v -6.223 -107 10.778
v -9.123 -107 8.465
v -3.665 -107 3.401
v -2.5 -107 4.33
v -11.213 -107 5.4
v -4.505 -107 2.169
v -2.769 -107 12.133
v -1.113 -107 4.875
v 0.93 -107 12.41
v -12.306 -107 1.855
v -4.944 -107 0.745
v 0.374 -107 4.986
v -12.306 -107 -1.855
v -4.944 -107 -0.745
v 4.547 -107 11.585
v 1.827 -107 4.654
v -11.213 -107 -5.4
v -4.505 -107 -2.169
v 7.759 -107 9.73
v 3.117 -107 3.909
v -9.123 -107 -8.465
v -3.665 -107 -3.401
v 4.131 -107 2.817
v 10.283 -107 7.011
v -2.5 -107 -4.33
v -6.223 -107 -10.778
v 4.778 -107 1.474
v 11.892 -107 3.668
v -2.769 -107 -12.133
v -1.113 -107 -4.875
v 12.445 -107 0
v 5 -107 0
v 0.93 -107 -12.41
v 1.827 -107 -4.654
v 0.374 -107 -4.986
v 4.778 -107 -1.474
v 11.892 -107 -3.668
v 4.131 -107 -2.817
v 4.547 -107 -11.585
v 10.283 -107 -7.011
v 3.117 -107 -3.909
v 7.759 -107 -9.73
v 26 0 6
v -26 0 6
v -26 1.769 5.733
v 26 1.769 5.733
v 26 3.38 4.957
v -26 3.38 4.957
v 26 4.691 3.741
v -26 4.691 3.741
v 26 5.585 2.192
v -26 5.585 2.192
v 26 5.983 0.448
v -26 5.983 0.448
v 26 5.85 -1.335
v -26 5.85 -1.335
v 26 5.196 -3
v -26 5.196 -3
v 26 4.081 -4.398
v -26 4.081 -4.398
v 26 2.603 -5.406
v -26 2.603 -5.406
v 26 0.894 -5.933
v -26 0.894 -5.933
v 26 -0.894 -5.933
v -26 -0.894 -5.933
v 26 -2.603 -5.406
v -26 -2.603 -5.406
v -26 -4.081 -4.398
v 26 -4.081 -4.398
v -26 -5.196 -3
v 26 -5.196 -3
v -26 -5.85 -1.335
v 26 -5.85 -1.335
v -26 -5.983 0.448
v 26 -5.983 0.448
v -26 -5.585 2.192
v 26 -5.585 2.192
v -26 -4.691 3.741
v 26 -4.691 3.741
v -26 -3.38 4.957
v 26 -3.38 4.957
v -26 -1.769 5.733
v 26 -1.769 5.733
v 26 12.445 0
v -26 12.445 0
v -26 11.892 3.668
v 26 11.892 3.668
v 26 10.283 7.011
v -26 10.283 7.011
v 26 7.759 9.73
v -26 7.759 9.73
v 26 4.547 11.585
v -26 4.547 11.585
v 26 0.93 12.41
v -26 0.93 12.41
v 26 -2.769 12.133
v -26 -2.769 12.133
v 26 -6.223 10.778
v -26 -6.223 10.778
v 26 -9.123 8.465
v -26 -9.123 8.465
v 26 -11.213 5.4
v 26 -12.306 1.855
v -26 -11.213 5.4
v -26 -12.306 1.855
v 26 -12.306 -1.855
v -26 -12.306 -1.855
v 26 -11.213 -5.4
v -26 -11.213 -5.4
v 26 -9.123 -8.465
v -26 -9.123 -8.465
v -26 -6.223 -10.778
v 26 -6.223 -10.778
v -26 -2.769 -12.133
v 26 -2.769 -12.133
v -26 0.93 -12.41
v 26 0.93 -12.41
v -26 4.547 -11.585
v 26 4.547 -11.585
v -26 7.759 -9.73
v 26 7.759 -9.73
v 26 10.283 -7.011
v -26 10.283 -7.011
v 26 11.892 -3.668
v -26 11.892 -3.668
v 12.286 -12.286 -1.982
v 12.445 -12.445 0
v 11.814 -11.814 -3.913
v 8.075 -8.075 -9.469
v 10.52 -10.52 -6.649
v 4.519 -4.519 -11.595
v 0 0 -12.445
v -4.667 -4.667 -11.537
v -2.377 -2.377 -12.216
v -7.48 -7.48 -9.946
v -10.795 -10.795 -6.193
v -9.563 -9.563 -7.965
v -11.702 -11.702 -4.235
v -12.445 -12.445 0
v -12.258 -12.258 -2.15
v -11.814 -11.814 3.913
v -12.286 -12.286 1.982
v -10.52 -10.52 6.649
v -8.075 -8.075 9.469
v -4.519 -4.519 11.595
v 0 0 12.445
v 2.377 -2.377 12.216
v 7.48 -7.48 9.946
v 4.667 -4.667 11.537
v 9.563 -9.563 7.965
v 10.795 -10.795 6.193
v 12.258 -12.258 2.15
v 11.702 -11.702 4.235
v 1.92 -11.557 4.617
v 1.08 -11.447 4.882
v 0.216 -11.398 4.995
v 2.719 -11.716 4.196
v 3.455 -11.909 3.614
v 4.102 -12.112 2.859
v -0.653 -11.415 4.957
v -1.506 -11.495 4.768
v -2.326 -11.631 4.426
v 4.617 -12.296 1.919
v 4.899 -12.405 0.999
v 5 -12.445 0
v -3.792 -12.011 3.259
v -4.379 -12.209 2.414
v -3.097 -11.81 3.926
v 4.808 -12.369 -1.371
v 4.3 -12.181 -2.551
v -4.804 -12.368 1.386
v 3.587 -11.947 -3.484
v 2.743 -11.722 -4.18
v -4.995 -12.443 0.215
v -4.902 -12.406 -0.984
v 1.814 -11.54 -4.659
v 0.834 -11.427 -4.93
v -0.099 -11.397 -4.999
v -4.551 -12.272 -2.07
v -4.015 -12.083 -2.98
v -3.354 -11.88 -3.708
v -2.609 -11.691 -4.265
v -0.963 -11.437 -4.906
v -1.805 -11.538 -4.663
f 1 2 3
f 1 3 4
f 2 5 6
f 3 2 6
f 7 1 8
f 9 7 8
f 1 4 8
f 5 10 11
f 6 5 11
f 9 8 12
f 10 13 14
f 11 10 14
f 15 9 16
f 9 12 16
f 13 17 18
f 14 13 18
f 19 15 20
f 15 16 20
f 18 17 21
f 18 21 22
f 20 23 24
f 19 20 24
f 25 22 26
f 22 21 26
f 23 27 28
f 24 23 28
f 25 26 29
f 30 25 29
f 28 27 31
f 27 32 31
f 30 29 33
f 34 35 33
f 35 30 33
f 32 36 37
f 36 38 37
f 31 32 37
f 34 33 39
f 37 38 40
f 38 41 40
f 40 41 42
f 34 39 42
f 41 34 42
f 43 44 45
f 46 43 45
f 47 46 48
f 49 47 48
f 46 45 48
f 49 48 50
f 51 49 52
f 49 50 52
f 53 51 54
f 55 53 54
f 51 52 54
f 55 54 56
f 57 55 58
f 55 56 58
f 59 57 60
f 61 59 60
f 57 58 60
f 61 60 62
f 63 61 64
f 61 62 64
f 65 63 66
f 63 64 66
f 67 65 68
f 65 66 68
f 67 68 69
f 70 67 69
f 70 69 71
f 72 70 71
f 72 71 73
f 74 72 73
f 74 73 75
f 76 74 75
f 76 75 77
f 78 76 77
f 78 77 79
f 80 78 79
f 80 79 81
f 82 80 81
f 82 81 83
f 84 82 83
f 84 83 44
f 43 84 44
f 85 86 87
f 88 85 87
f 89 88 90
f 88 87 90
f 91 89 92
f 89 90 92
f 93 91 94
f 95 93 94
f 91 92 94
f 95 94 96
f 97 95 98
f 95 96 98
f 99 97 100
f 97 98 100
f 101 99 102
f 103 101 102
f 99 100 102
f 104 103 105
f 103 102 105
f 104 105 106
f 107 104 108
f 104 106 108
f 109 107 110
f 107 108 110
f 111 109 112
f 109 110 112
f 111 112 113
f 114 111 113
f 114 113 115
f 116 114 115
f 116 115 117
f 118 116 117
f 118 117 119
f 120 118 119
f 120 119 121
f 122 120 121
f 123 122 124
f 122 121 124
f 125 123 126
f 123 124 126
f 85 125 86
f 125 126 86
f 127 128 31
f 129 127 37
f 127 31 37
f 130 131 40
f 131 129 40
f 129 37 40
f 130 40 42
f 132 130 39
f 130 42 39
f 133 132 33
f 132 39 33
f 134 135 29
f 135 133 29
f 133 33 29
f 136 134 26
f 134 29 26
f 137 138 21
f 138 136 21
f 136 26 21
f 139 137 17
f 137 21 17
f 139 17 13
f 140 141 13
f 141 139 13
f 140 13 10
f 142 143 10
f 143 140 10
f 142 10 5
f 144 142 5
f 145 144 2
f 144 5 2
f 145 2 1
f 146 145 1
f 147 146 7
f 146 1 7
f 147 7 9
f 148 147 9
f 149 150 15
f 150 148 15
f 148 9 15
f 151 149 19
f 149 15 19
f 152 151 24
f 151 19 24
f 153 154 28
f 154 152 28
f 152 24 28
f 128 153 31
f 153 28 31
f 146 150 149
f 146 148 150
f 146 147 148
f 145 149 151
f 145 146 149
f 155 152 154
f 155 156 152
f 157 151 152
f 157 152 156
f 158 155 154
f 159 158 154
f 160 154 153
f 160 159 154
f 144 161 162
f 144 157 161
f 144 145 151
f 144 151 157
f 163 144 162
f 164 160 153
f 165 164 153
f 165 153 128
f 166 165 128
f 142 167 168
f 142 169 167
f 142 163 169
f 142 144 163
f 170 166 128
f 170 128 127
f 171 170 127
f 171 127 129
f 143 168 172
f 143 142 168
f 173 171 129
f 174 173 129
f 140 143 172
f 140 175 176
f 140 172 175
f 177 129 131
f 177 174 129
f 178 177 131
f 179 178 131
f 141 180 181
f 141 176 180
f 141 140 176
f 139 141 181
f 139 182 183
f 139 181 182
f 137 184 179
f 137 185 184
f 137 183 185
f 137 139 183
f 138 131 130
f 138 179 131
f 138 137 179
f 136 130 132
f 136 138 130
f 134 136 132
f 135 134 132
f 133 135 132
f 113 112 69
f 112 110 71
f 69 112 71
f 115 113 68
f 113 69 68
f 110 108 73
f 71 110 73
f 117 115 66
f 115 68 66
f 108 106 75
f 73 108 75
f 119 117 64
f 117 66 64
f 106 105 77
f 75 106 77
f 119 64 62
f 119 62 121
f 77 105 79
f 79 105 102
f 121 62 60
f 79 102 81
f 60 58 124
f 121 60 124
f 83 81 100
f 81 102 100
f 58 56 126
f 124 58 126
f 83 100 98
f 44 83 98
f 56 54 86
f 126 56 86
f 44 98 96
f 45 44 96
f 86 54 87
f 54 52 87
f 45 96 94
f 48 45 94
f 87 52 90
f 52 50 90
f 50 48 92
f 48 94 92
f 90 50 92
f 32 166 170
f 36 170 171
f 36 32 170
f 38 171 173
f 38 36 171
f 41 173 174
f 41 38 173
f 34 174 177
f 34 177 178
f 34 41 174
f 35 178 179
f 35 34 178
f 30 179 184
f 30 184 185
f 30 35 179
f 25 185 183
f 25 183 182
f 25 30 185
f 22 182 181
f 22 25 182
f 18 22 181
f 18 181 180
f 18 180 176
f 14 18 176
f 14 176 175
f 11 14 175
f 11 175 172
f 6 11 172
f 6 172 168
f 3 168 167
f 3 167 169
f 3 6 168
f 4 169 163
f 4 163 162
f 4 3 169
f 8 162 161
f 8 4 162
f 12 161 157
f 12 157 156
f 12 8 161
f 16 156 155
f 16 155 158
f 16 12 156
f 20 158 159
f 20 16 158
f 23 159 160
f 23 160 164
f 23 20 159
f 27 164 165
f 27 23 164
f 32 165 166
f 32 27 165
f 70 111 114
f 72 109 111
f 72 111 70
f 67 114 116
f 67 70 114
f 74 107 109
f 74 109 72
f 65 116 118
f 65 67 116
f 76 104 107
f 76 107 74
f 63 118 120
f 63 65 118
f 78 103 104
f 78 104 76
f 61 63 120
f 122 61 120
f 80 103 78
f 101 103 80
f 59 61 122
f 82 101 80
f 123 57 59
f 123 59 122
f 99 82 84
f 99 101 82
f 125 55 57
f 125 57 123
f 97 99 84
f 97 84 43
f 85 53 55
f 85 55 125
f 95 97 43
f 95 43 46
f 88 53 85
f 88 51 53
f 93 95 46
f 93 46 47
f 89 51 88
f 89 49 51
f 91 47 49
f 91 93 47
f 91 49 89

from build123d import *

# Parameters (mm, degrees)
PIPE_START                      = -107
PIPE_26_9_X_3_2_1_OUTLINE_R     = 12.445
PIPE_26_9_X_3_2_1_OUTLINE_R_2   = 5
PIPE_26_9_X_3_2_1_DEPTH         = 94.5549999
PIPE_START_2                    = -12.4450001
PIPE_26_9_X_3_2_1_2_OUTLINE_R   = 12.445
PIPE_26_9_X_3_2_1_2_OUTLINE_R_2 = 5
PIPE_26_9_X_3_2_1_2_DEPTH       = 12.4450002
PIPE_START_3                    = -13
PIPE_26_9_X_3_2_1_3_DEPTH       = 26
PIPE_START_4                    = -26
PIPE_26_9_X_3_2_1_4_OUTLINE_R   = 12.445
PIPE_26_9_X_3_2_1_4_OUTLINE_R_2 = 5
PIPE_26_9_X_3_2_1_4_DEPTH       = 52
SKETCH13_R                      = 6
CUT_EXTRUDE1_DEPTH              = 57


with BuildPart() as part:
    # Pipe 26.9 X 3.2(1): read off the stored shape, not the designer's step
    # Pipe 26.9 X 3.2(1) outline → Pipe 26.9 X 3.2(1) (new body)
    with BuildSketch(Plane(origin=(0, 0, 0), x_dir=(1, 0, 0), z_dir=(0, 1, 0)).offset(PIPE_START)):
        Circle(PIPE_26_9_X_3_2_1_OUTLINE_R)
        Circle(PIPE_26_9_X_3_2_1_OUTLINE_R_2, mode=Mode.SUBTRACT)
    extrude(amount=PIPE_26_9_X_3_2_1_DEPTH)

    # Pipe 26.9 X 3.2_1 2 outline → Pipe 26.9 X 3.2_1 2 (add)
    with BuildSketch(Plane(origin=(0, 0, 0), x_dir=(1, 0, 0), z_dir=(0, 1, 0)).offset(PIPE_START_2)):
        Circle(PIPE_26_9_X_3_2_1_2_OUTLINE_R)
        Circle(PIPE_26_9_X_3_2_1_2_OUTLINE_R_2, mode=Mode.SUBTRACT)
    extrude(amount=PIPE_26_9_X_3_2_1_2_DEPTH)

    # Pipe 26.9 X 3.2_1 3 outline → Pipe 26.9 X 3.2_1 3 (cut)
    with BuildSketch(Plane.YZ.offset(PIPE_START_3)):
        with BuildLine():
            ThreePointArc((0, 12.445), (-12.445, 0), (0, -12.445))
            Line((0, -12.445), (0, 12.445))
        make_face()
    extrude(amount=PIPE_26_9_X_3_2_1_3_DEPTH, mode=Mode.SUBTRACT)


with BuildPart() as body_2:
    # Pipe 26.9 X 3.2_1 4 outline → Pipe 26.9 X 3.2_1 4 (new body)
    with BuildSketch(Plane.YZ.offset(PIPE_START_4)):
        Circle(PIPE_26_9_X_3_2_1_4_OUTLINE_R)
        Circle(PIPE_26_9_X_3_2_1_4_OUTLINE_R_2, mode=Mode.SUBTRACT)
    extrude(amount=PIPE_26_9_X_3_2_1_4_DEPTH)

    # Sketch13 → Cut-Extrude1 (cut)
    with BuildSketch(Plane.ZY.offset(26)):
        Circle(SKETCH13_R)
    extrude(amount=-CUT_EXTRUDE1_DEPTH, mode=Mode.SUBTRACT)


solid = Compound([part.part, body_2.part])
